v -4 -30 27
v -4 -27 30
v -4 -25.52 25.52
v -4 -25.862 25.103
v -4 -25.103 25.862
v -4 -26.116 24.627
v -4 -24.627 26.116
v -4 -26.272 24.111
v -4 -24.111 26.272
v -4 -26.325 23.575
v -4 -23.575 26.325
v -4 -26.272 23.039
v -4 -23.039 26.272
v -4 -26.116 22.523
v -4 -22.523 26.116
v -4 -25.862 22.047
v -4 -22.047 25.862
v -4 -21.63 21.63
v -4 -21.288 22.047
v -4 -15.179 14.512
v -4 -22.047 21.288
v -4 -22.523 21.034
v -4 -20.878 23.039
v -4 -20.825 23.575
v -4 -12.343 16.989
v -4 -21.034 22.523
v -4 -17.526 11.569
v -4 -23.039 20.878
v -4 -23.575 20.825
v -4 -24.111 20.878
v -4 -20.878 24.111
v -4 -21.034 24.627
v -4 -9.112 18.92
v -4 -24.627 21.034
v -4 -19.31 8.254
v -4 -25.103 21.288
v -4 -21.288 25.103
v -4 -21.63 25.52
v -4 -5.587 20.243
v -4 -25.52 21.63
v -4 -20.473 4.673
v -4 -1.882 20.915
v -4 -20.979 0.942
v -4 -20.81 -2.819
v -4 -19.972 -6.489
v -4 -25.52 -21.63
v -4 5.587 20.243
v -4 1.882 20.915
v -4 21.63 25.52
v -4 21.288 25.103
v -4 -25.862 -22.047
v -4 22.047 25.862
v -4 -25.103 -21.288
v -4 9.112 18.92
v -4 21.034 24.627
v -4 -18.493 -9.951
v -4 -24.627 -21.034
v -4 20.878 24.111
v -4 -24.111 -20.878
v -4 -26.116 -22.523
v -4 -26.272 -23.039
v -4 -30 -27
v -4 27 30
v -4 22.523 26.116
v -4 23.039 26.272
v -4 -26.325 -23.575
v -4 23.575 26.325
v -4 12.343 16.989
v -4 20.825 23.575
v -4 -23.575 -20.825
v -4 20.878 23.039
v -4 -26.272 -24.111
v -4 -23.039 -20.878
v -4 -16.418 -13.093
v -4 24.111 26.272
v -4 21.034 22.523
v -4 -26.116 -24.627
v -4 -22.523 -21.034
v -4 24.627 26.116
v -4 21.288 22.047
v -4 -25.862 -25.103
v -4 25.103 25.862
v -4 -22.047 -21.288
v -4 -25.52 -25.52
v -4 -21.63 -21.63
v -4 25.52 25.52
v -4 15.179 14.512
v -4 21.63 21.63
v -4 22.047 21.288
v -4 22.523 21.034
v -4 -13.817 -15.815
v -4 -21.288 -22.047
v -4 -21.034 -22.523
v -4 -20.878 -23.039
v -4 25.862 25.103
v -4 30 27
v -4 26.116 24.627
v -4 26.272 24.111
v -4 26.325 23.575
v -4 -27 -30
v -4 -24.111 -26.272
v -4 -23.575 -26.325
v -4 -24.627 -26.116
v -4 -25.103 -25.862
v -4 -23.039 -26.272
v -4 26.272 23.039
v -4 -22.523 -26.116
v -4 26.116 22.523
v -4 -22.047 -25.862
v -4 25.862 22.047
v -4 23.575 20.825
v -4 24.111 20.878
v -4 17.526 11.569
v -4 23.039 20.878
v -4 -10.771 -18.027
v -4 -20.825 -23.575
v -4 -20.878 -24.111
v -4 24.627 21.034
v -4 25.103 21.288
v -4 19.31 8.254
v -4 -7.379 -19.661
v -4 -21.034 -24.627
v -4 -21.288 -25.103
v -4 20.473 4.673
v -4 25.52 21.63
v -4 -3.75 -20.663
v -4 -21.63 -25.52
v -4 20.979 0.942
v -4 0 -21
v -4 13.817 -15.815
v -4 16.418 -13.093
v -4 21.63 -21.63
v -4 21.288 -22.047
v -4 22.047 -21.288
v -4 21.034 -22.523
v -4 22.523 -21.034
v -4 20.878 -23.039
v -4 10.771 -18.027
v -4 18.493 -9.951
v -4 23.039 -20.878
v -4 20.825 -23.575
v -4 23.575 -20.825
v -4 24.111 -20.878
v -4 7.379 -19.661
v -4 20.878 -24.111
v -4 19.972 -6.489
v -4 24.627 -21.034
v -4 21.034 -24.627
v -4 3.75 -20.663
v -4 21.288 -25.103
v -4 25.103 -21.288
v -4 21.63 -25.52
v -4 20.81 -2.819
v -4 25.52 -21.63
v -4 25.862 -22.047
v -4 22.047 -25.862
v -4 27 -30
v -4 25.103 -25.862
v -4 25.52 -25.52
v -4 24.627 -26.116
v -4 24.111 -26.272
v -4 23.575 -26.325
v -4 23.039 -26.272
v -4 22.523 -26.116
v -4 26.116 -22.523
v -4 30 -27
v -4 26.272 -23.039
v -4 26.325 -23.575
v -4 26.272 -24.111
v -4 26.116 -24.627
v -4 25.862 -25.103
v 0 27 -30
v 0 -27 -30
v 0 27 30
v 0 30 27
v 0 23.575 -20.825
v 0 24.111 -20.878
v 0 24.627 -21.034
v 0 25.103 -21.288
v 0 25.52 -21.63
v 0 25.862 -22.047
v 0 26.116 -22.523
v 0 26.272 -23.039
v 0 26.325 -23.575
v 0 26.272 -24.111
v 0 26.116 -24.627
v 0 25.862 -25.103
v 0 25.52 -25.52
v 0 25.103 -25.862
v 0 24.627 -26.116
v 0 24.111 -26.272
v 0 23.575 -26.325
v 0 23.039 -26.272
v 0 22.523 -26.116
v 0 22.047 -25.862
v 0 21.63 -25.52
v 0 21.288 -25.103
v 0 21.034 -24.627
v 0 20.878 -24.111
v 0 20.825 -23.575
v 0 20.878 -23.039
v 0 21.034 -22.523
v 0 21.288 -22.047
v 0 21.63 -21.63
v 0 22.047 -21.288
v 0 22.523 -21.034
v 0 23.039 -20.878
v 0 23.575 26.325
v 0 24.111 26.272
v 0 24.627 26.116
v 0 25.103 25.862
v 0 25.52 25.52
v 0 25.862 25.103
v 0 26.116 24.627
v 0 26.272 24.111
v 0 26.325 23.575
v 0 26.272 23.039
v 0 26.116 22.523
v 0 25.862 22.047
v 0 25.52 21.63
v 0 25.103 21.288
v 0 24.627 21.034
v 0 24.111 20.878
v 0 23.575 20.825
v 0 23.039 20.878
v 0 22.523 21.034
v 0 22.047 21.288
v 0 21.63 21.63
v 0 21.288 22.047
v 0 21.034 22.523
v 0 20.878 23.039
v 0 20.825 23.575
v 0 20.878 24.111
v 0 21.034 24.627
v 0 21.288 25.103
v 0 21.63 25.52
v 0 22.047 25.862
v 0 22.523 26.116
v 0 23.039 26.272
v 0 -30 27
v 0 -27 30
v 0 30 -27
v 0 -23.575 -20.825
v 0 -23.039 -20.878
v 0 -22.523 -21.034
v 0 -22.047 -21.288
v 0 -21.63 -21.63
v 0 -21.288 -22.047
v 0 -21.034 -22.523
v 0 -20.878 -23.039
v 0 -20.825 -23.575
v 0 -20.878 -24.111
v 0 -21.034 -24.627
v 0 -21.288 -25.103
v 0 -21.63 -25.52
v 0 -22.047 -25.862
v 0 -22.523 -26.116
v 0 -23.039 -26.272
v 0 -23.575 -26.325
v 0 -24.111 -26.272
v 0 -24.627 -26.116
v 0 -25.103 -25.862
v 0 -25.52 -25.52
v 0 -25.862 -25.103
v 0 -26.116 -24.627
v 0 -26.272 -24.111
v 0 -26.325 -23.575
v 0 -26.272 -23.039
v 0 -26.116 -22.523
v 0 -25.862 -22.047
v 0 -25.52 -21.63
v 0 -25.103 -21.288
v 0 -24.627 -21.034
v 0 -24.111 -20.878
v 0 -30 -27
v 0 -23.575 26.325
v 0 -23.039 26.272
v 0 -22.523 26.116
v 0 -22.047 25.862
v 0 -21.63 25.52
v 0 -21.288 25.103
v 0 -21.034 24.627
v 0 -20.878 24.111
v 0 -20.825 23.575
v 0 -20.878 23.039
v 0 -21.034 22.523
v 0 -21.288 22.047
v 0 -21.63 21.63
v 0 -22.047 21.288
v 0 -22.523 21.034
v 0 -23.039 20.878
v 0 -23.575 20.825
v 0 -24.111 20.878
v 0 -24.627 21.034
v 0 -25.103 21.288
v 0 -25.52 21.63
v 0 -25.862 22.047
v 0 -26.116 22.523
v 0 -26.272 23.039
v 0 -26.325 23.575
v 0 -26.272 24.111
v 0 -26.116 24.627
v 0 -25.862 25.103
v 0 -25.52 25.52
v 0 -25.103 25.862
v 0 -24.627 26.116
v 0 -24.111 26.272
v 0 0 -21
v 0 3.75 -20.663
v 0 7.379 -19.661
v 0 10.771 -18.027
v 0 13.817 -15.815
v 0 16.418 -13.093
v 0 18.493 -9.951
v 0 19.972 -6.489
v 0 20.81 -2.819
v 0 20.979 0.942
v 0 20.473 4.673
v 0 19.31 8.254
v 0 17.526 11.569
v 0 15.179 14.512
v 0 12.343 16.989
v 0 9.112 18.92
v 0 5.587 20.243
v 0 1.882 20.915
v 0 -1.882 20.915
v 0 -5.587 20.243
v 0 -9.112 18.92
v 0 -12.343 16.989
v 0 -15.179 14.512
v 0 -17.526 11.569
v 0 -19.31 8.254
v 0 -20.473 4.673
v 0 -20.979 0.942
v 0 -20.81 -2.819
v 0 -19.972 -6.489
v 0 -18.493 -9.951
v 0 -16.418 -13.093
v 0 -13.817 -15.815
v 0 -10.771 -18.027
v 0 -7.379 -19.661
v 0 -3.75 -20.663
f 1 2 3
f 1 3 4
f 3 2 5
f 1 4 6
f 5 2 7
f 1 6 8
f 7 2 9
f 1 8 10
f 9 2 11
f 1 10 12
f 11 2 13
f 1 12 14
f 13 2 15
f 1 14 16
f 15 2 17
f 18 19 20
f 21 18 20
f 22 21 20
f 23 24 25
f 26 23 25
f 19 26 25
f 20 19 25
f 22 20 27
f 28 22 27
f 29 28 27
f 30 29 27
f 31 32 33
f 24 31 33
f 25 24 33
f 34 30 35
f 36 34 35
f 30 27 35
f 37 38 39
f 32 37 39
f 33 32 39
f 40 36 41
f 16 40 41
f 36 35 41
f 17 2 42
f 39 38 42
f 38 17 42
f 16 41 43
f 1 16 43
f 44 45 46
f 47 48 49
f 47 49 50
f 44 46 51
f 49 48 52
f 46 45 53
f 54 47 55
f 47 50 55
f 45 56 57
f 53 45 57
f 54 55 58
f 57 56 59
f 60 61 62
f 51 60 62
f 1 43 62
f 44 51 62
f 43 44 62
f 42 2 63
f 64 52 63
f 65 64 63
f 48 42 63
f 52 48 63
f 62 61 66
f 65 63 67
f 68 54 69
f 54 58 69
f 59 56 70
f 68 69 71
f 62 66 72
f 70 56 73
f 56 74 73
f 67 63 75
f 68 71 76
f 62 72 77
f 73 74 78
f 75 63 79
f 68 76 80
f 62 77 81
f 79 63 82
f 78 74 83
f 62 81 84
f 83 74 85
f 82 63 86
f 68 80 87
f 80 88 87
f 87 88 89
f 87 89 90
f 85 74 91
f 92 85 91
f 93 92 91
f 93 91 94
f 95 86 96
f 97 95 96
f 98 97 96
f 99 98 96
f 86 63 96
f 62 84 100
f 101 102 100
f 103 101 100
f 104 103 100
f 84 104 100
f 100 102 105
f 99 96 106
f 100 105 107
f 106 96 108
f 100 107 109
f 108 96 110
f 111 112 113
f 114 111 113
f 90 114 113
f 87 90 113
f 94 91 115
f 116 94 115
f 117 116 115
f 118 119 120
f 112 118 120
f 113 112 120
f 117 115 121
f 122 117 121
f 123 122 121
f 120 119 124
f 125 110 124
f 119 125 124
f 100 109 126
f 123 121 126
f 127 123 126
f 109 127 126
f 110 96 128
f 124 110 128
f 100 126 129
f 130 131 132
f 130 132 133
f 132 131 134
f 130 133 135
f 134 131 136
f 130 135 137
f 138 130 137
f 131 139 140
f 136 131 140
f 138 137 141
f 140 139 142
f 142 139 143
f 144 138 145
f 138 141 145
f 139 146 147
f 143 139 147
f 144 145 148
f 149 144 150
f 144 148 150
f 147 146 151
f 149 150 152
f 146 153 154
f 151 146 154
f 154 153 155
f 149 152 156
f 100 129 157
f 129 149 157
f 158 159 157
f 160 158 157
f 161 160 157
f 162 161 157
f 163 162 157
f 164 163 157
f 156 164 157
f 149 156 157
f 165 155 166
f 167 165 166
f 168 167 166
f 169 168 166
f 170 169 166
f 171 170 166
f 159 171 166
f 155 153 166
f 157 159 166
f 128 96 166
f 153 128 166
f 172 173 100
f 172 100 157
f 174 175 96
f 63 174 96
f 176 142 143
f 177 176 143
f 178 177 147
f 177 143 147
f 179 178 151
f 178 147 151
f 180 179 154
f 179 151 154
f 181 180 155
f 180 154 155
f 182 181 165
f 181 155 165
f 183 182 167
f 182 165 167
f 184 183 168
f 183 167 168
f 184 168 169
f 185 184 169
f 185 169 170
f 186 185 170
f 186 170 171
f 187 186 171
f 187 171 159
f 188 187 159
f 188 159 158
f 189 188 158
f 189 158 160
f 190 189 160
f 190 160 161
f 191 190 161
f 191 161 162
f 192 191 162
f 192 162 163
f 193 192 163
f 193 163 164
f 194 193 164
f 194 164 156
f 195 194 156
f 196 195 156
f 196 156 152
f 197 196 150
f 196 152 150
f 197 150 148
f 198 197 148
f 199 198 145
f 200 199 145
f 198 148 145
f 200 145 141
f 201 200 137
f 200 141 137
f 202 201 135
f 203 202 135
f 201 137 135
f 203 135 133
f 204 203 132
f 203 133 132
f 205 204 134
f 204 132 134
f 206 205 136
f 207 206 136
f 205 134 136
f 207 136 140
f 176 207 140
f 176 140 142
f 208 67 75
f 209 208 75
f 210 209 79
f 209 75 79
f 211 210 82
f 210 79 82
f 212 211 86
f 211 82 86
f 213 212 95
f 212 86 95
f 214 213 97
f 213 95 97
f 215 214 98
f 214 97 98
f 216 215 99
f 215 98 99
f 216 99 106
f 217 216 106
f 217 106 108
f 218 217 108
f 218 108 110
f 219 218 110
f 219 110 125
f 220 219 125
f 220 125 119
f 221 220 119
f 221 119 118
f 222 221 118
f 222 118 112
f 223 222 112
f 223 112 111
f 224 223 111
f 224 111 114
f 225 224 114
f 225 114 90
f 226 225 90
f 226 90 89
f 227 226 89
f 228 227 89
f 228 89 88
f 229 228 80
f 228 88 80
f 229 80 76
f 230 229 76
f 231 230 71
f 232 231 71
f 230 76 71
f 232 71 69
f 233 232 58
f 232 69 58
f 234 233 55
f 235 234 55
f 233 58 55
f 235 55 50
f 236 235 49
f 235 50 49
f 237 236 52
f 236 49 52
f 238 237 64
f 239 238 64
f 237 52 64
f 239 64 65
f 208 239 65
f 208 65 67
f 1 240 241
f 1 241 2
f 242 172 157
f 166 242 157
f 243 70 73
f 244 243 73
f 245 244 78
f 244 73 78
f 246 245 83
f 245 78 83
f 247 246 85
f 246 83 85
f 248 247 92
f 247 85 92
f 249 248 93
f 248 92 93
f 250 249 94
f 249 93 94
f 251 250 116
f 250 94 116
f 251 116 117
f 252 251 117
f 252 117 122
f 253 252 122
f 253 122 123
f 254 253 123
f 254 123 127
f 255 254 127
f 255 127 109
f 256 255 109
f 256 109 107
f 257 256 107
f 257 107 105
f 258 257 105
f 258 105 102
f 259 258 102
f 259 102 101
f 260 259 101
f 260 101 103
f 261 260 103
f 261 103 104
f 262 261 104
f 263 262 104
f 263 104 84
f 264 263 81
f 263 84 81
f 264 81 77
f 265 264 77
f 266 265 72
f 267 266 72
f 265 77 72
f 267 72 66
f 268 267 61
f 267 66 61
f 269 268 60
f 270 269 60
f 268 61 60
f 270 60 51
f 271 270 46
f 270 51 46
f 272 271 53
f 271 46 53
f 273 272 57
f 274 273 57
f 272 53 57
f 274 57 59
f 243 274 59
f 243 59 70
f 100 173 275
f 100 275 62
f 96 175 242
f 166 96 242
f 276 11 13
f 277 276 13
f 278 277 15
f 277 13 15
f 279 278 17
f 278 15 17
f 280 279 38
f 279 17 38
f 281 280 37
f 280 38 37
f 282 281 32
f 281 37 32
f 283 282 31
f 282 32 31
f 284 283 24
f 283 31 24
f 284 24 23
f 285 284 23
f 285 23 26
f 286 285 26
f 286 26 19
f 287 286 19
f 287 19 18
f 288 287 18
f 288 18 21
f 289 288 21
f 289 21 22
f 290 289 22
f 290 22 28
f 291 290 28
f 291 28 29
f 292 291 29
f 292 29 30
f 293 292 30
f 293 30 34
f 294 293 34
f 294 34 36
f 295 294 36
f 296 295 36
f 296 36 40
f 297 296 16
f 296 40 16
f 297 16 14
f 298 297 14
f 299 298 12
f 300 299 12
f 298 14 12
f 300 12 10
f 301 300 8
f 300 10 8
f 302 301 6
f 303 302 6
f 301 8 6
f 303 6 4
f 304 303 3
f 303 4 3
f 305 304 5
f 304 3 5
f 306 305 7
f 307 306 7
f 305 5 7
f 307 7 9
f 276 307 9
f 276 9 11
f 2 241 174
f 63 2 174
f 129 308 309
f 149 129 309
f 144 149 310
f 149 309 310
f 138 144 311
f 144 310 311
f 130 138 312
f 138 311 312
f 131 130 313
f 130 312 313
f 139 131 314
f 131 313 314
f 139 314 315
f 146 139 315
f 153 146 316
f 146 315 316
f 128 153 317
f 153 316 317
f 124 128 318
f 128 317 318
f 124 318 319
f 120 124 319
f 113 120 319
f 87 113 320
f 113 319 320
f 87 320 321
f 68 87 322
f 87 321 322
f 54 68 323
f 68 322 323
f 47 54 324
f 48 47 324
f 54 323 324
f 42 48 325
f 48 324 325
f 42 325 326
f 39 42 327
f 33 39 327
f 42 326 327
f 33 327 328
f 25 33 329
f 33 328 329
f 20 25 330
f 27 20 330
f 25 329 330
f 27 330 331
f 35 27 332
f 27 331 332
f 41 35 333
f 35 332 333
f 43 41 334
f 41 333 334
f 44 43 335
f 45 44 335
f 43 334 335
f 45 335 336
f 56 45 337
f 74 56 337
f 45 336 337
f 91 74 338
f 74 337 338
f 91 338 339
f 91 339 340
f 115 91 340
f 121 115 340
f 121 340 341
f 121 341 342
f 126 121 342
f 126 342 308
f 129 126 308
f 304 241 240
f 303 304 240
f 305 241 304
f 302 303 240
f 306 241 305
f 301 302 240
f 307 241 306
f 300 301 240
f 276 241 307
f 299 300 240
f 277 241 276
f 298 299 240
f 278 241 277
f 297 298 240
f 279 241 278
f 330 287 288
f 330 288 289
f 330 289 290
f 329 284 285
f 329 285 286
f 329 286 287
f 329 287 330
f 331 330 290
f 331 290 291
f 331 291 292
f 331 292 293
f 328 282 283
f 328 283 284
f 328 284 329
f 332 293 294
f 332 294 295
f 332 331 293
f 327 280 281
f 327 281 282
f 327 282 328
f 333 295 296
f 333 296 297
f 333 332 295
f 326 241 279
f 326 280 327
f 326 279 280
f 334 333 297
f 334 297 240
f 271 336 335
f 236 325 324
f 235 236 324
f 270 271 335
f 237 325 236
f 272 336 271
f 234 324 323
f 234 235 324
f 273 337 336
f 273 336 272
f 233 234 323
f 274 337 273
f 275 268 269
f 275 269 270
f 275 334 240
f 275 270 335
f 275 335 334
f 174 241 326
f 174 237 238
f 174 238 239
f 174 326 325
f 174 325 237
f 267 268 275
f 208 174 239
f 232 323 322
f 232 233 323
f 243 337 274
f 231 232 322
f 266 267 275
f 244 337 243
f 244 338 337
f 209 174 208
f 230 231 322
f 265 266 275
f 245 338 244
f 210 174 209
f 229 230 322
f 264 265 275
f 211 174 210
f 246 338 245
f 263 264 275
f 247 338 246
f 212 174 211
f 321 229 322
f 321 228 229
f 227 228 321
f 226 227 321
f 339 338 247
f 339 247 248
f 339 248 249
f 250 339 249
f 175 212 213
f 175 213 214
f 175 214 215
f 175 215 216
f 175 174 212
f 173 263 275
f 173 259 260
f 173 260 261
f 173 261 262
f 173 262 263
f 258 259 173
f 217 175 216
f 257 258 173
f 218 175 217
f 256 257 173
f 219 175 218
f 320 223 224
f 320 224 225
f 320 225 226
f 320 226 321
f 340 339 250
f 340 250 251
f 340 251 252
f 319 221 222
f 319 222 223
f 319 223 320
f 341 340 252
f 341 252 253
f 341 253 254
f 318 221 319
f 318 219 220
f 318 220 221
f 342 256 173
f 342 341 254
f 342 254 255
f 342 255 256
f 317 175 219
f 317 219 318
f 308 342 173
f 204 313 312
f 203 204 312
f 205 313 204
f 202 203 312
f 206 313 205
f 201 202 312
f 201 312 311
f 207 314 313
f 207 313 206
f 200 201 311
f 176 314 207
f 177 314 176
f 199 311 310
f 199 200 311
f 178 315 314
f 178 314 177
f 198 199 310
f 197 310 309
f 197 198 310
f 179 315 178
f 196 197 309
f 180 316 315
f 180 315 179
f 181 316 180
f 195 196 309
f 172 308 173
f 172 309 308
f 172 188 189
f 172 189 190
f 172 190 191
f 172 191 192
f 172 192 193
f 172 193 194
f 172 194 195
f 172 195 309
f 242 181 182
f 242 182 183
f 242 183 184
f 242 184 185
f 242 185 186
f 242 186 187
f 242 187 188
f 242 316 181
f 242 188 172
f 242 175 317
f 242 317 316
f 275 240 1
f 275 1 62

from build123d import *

# Parameters (mm, degrees)
SZKIC1_W                = 60
SZKIC1_H                = 60
SZKIC1_R                = 21
ODGI_CIE_BAZOWE1_DEPTH  = 4
OTW_R_POD_RUB_M51_D     = 5.5
OTW_R_POD_RUB_M51_DEPTH = 11
OTW_R_POD_RUB_M51_TIP   = 1.652366702
SFAZOWANIE1_SIZE        = 3


# Sheet-metal steps are written as plain solids
with BuildPart() as part:
    # Szkic1 → Odgięcie bazowe1 (new body)
    with BuildSketch(Plane(origin=(0, 0, 0), x_dir=(0, 0, -1), z_dir=(1, 0, 0))):
        Rectangle(SZKIC1_W, SZKIC1_H)
        Circle(SZKIC1_R, mode=Mode.SUBTRACT)
    extrude(amount=-ODGI_CIE_BAZOWE1_DEPTH)

    # Otwór pod śrubę M51
    with Locations(Plane(origin=(0, 0, 0), x_dir=(0, 0, -1), z_dir=(1, 0, 0))):
        with Locations((-23.575, 23.575), (23.575, 23.575), (23.575, -23.575), (-23.575, -23.575)):
            Hole(OTW_R_POD_RUB_M51_D / 2, depth=OTW_R_POD_RUB_M51_DEPTH)
            with Locations((0, 0, -(OTW_R_POD_RUB_M51_DEPTH + OTW_R_POD_RUB_M51_TIP / 2))):  # 118° drill point
                Cone(0, OTW_R_POD_RUB_M51_D / 2, OTW_R_POD_RUB_M51_TIP, mode=Mode.SUBTRACT)

    # Sfazowanie1
    sfazowanie1_edges = [part.edges().sort_by_distance(p)[0] for p in [
        (-2, -30, -30),
        (-2, -30, 30),
        (-2, 30, 30),
        (-2, 30, -30),
    ]]
    chamfer(sfazowanie1_edges, length=SFAZOWANIE1_SIZE)


solid = part.part
